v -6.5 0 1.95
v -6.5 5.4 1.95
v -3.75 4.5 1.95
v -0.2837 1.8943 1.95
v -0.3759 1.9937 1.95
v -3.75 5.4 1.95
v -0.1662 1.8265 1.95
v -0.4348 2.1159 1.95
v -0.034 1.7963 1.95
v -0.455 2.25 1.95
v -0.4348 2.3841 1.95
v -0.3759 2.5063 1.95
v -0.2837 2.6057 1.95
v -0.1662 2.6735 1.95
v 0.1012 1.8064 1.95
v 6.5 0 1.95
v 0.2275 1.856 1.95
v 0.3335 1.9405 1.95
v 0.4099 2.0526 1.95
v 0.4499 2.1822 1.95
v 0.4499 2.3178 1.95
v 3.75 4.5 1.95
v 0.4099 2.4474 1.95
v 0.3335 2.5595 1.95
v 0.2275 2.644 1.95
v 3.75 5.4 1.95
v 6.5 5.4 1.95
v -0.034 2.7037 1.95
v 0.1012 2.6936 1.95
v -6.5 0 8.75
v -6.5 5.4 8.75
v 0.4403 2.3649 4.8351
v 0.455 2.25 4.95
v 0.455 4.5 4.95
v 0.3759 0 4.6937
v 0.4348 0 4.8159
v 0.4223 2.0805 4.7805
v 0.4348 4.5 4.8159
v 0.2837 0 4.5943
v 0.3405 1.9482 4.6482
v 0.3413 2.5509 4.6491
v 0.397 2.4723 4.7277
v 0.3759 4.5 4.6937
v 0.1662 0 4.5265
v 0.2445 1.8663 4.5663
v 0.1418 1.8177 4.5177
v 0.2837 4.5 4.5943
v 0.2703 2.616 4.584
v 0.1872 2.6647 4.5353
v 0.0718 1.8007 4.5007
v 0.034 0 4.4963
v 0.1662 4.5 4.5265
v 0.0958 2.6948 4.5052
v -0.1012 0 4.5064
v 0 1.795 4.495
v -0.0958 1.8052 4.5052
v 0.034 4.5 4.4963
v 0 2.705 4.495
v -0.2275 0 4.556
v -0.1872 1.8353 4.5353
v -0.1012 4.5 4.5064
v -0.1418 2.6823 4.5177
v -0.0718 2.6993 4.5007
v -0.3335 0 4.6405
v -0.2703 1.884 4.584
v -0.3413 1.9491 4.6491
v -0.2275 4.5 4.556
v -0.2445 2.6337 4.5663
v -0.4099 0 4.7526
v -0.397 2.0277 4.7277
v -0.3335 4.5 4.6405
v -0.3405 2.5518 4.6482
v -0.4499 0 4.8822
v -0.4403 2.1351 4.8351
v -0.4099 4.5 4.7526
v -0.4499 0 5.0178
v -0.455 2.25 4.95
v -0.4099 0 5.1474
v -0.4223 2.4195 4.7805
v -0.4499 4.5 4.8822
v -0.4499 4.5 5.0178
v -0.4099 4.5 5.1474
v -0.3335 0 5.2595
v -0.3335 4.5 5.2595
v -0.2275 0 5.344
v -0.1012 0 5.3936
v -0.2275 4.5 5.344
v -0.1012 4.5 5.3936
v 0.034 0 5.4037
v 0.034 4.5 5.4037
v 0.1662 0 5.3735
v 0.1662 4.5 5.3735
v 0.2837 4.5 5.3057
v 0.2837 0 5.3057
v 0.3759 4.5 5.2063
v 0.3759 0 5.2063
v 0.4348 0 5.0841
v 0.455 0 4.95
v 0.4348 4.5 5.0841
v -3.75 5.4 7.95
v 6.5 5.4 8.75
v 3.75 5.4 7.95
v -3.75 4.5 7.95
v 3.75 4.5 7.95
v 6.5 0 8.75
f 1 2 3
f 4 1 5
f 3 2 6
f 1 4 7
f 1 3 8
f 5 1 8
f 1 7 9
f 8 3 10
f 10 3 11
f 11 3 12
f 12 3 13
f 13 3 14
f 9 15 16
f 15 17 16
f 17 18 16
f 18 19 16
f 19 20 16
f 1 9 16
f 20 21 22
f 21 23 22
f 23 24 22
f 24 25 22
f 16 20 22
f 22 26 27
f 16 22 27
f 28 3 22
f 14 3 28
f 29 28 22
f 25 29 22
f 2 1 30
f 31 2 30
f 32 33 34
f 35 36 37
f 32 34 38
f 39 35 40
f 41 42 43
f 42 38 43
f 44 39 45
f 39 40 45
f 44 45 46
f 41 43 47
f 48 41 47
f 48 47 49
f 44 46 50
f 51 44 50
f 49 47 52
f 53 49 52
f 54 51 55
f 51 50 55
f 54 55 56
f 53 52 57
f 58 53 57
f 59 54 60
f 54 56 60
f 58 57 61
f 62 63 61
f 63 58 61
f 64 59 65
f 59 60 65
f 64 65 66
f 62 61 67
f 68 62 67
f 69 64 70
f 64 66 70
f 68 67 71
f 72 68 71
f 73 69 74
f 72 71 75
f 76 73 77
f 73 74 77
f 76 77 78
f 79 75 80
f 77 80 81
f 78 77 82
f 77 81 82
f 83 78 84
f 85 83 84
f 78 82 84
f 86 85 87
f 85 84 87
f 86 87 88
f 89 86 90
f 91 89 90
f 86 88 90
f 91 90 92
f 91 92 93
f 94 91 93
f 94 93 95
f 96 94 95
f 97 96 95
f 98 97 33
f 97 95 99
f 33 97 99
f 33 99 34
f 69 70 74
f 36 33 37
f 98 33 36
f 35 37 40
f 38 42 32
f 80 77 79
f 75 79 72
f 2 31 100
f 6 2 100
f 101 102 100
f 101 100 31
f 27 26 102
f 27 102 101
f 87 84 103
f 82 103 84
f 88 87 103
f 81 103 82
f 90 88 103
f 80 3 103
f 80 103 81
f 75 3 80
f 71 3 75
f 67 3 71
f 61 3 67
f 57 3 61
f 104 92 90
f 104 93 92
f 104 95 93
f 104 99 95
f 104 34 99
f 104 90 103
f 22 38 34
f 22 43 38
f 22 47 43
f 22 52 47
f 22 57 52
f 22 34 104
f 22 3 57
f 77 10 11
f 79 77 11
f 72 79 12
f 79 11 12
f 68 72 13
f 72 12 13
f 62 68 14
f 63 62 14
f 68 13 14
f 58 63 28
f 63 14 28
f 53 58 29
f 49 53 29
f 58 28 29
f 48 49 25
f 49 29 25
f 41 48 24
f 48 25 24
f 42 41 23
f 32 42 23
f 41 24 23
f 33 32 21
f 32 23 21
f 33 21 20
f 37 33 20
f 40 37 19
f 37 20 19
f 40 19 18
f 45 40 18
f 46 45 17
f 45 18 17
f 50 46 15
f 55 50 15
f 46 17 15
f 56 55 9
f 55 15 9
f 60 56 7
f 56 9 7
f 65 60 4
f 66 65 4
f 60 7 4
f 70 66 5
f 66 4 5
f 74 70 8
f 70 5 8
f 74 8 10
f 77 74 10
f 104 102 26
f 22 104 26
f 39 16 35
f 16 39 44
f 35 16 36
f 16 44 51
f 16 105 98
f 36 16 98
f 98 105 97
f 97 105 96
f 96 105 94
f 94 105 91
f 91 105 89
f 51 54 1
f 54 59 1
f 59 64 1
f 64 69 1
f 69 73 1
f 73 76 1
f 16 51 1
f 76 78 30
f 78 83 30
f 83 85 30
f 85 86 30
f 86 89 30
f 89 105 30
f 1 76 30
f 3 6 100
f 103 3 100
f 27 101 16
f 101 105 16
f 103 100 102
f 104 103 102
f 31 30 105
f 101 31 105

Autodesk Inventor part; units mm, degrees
ref_plane "YZ Plane" through (0, 0, 0) normal (1, 0, 0) x (0, 1, 0)
ref_plane "XZ Plane" through (0, 0, 0) normal (0, 1, 0) x (-1, 0, 0)
ref_plane "XY Plane" through (0, 0, 0) normal (0, 0, 1) x (1, 0, 0)
sketch "Skizze1" plane through (0, 0, 0) normal (0, 1, 0) x (-1, 0, 0)
  line L0 (-6.5, -8.75) -> (6.5, -8.75)
  line L1 (6.5, -8.75) -> (6.5, 8.75)
  line L2 (6.5, 8.75) -> (-6.5, 8.75)
  line L3 (-6.5, 8.75) -> (-6.5, -8.75)
  line L4 (-6.5, -8.75) -> (6.5, 8.75) construction
  line L5 (6.5, -8.75) -> (-6.5, 8.75) construction
  point P0 (0, 0)
  dimension "d0" = 13
  dimension "d1" = 17.5
extrude "Extrusion1" add sketch "Skizze1" along normal blind 5.5
sketch "Skizze2" plane through (0, 5.5, 0) normal (0, 1, 0) x (1, 0, 0)
  line L0 (-6.5, 8.75) -> (-6.5, -8.75) projected
  line L1 (-6.5, -8.75) -> (6.5, -8.75) projected
  line L2 (6.5, -8.75) -> (6.5, 8.75) projected
  line L3 (6.5, 8.75) -> (-6.5, 8.75) projected
  line L4 (3.75, -1.95) -> (-3.75, -1.95)
  line L5 (-3.75, -1.95) -> (-3.75, -7.95)
  line L6 (-3.75, -7.95) -> (3.75, -7.95)
  line L7 (3.75, -7.95) -> (3.75, -1.95)
  line L8 (3.75, -1.95) -> (-3.75, -7.95) construction
  line L9 (-3.75, -1.95) -> (3.75, -7.95) construction
  point P0 (0, 0)
  point P1 (0, -4.95)
  dimension "d4" = 7.5
  dimension "d5" = 6
  dimension "d17" = 0.8
extrude "Extrusion2" cut sketch "Skizze2" against normal blind 1 contours L7 L6 L5 L4
sketch "Skizze3" plane through (0, 5.5, 0) normal (0, 1, 0) x (1, 0, 0)
  line L0 (-6.5, 8.75) -> (-6.5, -8.75) projected
  line L1 (3.75, -7.95) -> (-3.75, -7.95) projected
  line L2 (-3.75, -7.95) -> (-3.75, -1.95) projected
  line L3 (-3.75, -1.95) -> (3.75, -1.95) projected
  line L4 (3.75, -1.95) -> (3.75, -7.95) projected
  line L5 (-6.5, 8.75) -> (-6.5, -8.75) projected
  line L6 (-6.5, -8.75) -> (6.5, -8.75) projected
  line L7 (6.5, -8.75) -> (6.5, 8.75) projected
  line L8 (6.5, 8.75) -> (-6.5, 8.75) projected
  line L9 (6.5, -8.75) -> (6.5, 8.75) projected
  line L10 (-6.5, -8.75) -> (6.5, -8.75)
  line L11 (6.5, -8.75) -> (6.5, -1.95)
  line L12 (6.5, -1.95) -> (-6.5, -1.95)
  line L13 (-6.5, -1.95) -> (-6.5, -8.75)
  point P0 (0, 0)
  point P1 (-6.5, -1.95)
  dimension "d8" = 6.8
extrude "Extrusion3" cut sketch "Skizze3" against normal blind 0.1 contours L12 L2 L1 L4 L7 L6 L0
sketch "Skizze4" plane through (6.5, 0, -8.75) normal (0, 0, -1) x (-1, 0, 0)
  line L0 (0, 0) -> (13, 0) projected
  line L1 (13, 0) -> (13, 5.5) projected
  line L2 (0, 5.5) -> (13, 5.5) projected
  line L3 (0, 0) -> (0, 5.5) projected
  line L4 (10.15, 4.75) -> (2.85, 4.75)
  line L5 (2.85, 4.75) -> (2.85, 0.75)
  line L6 (2.85, 0.75) -> (10.15, 0.75)
  line L7 (10.15, 0.75) -> (10.15, 4.75)
  line L8 (10.15, 4.75) -> (2.85, 0.75) construction
  line L9 (2.85, 4.75) -> (10.15, 0.75) construction
  point P0 (6.5, 0)
  point P1 (6.5, 2.75)
  dimension "d11" = 7.3
  dimension "d12" = 4
extrude "Extrusion4" cut sketch "Skizze4" against normal blind 0.1 contours L7 L6 L5 L4
sketch "Skizze5" plane through (0, 5.5, 0) normal (0, 1, 0) x (1, 0, 0)
  line L0 (-6.5, -1.95) -> (6.5, -1.95) projected
  line L1 (6.5, -1.95) -> (6.5, 8.75) projected
  line L2 (6.5, 8.75) -> (-6.5, 8.75) projected
  line L3 (-6.5, 8.75) -> (-6.5, -1.95) projected
  point P0 (0, 0)
extrude "Extrusion5" cut sketch "Skizze5" against normal blind 10
sketch "Skizze6" plane through (0, 4.5, 0) normal (0, 1, 0) x (1, 0, 0)
  line L0 (-3.75, -7.95) -> (-3.75, -1.95) projected
  line L1 (3.75, -7.95) -> (-3.75, -7.95) projected
  line L2 (3.75, -1.95) -> (3.75, -7.95) projected
  line L3 (-3.75, -1.95) -> (3.75, -1.95) projected
  circle A0 centre (0, -4.95) radius 0.455
  point P0 (0, 0)
extrude "Extrusion6" cut sketch "Skizze6" against normal blind 10 contours A0
sketch "Skizze7" plane through (6.5, 0, 1.95) normal (0, 0, -1) x (-1, 0, 0)
  line L0 (13, 5.4) -> (10.25, 5.4) projected
  line L1 (10.25, 5.4) -> (10.25, 4.5) projected
  line L2 (10.25, 4.5) -> (2.75, 4.5) projected
  line L3 (2.75, 5.4) -> (2.75, 4.5) projected
  line L4 (2.75, 5.4) -> (0, 5.4) projected
  line L5 (0, 0) -> (0, 5.4) projected
  line L6 (13, 0) -> (0, 0) projected
  line L7 (13, 5.4) -> (13, 0) projected
  line L8 (6.045, 4.5) -> (6.955, 4.5) projected
  line L9 (2.75, 4.5) -> (10.25, 4.5) projected
  line L10 (10.25, 4.5) -> (2.75, 4.5) projected
  line L11 (6.955, 4.5) -> (6.955, 0) projected
  line L12 (6.045, 4.5) -> (6.045, 0) projected
  circle A0 centre (6.5, 2.25) radius 0.455
  point P0 (6.5, 0)
extrude "Extrusion7" cut sketch "Skizze7" against normal up to surface contours A0
properties part number "00_HuaweiP30_Telelens_prismonly"
